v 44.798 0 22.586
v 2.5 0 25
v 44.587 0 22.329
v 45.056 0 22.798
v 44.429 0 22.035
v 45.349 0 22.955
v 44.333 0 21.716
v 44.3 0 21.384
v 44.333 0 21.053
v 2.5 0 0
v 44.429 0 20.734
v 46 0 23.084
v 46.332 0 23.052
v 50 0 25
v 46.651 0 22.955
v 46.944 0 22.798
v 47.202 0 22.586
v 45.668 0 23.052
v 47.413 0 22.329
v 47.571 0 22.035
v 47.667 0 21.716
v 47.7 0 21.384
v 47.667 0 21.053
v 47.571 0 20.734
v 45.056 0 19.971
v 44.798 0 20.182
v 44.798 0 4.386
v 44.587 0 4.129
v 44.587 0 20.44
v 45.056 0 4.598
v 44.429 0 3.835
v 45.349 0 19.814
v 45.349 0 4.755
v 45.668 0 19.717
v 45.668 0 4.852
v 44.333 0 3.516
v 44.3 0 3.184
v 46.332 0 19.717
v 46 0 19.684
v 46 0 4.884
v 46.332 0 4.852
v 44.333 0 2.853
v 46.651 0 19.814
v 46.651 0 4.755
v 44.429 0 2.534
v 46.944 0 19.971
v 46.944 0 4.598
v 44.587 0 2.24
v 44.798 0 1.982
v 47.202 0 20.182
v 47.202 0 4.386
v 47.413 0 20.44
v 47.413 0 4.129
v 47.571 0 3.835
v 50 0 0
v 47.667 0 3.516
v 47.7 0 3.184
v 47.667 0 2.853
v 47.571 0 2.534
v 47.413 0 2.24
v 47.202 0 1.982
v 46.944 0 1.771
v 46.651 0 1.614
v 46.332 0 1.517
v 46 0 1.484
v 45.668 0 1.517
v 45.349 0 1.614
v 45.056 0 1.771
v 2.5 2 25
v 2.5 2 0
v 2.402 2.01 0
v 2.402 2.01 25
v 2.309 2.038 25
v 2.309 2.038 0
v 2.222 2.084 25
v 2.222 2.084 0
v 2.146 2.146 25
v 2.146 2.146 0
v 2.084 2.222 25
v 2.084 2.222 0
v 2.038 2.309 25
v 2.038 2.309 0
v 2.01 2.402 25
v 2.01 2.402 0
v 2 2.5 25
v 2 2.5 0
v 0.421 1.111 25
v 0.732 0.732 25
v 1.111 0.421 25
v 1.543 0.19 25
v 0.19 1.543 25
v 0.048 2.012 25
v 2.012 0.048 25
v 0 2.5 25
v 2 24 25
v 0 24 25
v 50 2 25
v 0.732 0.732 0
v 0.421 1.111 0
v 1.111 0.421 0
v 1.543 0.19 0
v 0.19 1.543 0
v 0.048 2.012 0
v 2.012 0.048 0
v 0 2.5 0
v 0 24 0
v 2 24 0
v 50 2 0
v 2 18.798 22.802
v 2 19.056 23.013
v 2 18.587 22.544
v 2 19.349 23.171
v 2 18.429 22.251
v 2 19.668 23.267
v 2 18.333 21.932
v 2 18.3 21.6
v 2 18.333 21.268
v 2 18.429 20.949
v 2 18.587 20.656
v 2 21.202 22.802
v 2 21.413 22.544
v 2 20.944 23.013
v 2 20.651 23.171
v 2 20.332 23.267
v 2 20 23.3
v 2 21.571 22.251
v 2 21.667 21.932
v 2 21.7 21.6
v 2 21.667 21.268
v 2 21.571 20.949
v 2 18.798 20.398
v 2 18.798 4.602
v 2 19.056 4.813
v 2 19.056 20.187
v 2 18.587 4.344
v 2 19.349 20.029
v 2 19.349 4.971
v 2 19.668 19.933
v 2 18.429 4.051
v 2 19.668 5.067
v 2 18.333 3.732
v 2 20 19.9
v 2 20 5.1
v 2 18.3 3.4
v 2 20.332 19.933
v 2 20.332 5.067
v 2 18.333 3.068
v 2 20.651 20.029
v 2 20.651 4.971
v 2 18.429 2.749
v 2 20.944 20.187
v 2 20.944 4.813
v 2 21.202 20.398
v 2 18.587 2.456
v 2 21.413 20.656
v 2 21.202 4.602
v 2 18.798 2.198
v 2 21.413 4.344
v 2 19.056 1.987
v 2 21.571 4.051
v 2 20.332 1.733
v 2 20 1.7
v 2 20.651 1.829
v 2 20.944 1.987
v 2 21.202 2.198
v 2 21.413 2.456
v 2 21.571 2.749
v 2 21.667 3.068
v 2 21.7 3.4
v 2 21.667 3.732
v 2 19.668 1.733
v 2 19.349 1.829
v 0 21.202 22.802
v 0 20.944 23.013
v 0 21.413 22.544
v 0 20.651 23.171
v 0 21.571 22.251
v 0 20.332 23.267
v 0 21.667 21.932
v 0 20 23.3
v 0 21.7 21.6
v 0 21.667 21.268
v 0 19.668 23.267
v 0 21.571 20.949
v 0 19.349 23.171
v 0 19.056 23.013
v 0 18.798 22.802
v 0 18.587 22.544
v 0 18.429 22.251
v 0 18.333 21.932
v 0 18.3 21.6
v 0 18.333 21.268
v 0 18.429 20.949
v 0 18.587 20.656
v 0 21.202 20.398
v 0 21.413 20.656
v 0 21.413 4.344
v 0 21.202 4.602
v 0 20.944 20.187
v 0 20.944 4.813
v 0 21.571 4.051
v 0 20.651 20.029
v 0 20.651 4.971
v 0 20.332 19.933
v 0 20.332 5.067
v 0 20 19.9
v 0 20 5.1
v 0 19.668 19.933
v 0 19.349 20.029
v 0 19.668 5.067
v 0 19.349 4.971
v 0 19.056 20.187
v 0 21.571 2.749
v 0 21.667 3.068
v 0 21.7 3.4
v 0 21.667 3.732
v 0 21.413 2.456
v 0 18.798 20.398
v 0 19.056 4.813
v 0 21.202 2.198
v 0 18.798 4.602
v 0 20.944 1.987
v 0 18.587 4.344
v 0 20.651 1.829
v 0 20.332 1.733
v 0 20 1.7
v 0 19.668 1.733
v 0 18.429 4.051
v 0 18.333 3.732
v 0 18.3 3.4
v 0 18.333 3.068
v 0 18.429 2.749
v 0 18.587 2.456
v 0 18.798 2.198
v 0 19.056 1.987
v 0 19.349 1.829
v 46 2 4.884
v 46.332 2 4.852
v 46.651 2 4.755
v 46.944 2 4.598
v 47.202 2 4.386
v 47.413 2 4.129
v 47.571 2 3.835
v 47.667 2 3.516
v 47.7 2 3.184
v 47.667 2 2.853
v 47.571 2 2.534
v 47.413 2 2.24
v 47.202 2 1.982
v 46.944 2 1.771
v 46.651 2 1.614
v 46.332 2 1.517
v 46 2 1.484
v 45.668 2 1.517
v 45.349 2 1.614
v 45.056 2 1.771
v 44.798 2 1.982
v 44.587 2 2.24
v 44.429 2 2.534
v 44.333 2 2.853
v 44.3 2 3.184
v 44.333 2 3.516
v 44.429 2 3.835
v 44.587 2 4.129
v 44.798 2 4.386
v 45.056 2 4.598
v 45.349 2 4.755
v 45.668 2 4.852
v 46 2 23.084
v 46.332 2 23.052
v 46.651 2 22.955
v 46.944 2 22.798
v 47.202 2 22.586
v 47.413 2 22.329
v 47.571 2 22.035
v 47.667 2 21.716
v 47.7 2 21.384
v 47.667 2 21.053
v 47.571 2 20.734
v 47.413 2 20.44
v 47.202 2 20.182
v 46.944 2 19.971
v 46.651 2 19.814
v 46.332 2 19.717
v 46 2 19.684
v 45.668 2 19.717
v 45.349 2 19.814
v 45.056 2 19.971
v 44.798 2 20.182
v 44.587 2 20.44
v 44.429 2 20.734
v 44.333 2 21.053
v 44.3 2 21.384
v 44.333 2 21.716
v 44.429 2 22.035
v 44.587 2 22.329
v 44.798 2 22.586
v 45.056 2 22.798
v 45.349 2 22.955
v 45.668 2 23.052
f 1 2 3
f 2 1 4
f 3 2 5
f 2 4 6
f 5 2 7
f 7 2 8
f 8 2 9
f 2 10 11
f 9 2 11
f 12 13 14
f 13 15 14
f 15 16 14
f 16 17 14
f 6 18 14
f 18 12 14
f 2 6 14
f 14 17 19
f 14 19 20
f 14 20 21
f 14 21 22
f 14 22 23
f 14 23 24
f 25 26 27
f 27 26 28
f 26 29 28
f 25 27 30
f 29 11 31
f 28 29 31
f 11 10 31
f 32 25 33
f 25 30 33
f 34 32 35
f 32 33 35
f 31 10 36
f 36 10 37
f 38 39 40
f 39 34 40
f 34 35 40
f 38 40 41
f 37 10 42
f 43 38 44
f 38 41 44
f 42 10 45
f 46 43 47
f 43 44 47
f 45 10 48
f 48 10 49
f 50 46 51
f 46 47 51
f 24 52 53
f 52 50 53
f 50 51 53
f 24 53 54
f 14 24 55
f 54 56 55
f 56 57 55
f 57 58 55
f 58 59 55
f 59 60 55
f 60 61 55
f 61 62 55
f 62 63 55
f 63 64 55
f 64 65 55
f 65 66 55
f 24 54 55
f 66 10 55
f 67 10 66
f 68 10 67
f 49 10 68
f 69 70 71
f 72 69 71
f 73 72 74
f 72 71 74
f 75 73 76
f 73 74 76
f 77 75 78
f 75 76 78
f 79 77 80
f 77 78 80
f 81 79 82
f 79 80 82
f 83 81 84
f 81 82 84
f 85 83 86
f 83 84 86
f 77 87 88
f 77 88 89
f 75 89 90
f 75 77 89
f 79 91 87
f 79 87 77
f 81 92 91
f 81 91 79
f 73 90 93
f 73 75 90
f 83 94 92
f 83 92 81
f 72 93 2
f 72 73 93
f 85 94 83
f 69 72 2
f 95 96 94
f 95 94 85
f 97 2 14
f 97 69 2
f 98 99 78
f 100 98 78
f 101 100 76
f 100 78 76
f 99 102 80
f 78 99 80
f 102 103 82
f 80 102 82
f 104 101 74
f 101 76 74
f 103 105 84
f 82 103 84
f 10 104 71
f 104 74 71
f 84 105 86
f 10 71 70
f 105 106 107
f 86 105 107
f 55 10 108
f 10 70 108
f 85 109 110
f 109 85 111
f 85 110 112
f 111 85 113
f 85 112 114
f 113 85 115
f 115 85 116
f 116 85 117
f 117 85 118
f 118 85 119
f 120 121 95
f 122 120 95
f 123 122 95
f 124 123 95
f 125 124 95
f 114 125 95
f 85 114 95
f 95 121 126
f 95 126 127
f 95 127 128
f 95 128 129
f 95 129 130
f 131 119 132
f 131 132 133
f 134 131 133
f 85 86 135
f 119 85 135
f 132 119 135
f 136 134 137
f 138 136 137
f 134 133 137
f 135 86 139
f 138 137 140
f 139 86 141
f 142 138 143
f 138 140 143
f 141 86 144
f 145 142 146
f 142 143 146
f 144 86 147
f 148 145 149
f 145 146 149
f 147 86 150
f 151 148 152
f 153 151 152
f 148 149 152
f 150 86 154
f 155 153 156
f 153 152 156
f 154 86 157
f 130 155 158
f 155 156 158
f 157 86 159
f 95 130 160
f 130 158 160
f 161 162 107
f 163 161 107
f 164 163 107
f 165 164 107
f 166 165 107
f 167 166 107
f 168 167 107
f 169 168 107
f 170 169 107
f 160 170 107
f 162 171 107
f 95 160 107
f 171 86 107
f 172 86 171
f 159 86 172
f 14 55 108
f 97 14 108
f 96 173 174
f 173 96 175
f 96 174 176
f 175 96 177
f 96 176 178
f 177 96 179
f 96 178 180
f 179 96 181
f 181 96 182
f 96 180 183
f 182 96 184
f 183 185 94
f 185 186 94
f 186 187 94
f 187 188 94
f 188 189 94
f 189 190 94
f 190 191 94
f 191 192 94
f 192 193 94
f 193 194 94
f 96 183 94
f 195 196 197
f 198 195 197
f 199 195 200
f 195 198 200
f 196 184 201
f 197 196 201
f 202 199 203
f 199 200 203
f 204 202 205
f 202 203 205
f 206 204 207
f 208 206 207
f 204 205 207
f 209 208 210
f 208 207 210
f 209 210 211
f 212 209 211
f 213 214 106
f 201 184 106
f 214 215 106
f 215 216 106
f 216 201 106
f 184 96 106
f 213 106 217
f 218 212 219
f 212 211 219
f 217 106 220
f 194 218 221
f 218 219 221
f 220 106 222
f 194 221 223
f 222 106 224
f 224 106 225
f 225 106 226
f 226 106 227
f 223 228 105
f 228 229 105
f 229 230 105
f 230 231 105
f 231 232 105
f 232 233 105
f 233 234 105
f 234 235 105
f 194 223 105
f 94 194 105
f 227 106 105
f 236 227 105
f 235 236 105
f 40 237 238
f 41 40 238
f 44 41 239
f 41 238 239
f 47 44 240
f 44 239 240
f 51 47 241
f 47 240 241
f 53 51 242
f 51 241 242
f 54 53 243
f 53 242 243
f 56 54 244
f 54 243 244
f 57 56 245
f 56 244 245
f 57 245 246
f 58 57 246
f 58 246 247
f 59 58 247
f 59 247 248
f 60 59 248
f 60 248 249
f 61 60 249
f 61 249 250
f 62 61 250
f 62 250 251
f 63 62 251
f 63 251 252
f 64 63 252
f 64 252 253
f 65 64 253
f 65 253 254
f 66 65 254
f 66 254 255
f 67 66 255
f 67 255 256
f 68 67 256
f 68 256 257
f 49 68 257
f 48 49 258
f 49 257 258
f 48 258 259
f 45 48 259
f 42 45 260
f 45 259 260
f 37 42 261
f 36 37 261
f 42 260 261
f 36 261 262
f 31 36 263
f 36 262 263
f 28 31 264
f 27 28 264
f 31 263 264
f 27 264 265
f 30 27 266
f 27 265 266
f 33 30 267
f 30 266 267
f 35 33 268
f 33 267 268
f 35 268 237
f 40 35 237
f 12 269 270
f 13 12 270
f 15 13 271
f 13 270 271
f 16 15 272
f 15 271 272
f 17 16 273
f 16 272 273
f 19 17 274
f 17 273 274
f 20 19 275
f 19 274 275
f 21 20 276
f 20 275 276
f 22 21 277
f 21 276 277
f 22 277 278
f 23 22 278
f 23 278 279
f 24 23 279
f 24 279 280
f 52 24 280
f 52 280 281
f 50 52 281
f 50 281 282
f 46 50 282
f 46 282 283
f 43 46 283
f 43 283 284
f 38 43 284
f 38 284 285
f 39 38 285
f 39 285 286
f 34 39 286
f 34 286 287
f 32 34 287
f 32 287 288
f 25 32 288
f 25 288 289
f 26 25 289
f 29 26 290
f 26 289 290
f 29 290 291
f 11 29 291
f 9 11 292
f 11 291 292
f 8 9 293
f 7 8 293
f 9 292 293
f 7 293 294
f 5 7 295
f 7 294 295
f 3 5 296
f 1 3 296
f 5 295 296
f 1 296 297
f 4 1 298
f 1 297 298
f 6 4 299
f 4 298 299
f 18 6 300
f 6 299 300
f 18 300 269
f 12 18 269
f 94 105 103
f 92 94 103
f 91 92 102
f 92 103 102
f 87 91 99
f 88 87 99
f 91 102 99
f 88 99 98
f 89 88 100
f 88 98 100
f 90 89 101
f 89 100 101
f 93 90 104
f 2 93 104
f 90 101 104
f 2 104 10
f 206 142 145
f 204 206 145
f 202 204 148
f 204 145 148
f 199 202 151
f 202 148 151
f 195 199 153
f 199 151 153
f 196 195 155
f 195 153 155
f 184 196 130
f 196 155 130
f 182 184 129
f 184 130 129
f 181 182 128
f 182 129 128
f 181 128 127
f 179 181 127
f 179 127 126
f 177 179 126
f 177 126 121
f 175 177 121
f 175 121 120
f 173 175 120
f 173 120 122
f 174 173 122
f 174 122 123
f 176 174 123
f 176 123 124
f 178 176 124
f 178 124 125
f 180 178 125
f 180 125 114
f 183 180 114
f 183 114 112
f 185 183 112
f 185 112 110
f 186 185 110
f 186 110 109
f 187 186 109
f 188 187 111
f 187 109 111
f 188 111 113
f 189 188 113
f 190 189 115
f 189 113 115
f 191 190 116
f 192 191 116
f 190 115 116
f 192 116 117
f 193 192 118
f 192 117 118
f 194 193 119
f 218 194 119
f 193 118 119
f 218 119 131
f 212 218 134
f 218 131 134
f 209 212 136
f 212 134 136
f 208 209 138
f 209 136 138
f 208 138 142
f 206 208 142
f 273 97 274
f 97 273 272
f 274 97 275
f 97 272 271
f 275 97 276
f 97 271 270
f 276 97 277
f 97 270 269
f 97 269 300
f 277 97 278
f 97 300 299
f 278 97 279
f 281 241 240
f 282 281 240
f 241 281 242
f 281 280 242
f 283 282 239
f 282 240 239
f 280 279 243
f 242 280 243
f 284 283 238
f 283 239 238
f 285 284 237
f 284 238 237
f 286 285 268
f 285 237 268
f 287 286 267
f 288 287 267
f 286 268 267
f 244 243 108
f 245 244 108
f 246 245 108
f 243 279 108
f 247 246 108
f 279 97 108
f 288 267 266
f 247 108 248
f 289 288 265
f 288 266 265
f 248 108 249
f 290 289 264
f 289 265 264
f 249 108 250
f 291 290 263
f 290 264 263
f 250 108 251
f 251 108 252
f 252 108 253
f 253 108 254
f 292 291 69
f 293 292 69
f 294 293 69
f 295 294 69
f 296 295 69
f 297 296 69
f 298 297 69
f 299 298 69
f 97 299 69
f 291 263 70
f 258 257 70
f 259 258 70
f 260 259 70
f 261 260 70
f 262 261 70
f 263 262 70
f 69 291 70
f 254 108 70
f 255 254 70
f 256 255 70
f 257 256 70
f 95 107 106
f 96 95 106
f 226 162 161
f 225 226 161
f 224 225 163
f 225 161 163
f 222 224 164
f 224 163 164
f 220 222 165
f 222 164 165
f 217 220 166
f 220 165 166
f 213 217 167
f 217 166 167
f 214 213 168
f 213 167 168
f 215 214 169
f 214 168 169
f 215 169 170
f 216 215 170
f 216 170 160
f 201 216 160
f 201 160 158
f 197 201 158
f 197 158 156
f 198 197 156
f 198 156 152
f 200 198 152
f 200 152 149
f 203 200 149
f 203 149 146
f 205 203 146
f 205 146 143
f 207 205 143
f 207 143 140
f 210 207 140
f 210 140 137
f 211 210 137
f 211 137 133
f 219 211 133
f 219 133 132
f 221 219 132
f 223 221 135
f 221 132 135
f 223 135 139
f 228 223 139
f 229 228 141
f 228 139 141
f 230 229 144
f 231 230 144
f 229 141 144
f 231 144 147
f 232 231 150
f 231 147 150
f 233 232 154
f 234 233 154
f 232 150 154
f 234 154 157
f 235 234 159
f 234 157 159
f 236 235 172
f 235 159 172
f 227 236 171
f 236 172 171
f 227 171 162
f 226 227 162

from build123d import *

# Parameters (mm, degrees)
SM_BASE_FLANGE_1_DEPTH = 25
SKETCH_6_R             = 1.7
CUT_EXTRUDE_1_DEPTH    = 10
SKETCH_7_R             = 1.7
CUT_EXTRUDE_2_DEPTH    = 10


# Sheet-metal steps are written as plain solids
with BuildPart() as part:
    # Sketch 1 → 基体-法兰1 (new body)
    with BuildSketch(Plane.XY):
        with BuildLine():
            Line((0, 24), (0, 2.5))
            ThreePointArc((0, 2.5), (0.732233047, 0.732233047), (2.5, 0))
            Line((2.5, 0), (50, 0))
            Line((50, 0), (50, 2))
            Line((50, 2), (2.5, 2))
            ThreePointArc((2.5, 2), (2.146446609, 2.146446609), (2, 2.5))
            Line((2, 2.5), (2, 24))
            Line((2, 24), (0, 24))
        make_face()
    extrude(amount=SM_BASE_FLANGE_1_DEPTH)

    # 草图6 → 切除-拉伸1 (cut)
    with BuildSketch(Plane(origin=(2, 0, 0), x_dir=(0, 0, -1), z_dir=(1, 0, 0))):
        with Locations((-3.4, 20)):
            Circle(SKETCH_6_R)
        with Locations((-21.6, 20)):
            Circle(SKETCH_6_R)
    extrude(amount=-CUT_EXTRUDE_1_DEPTH, mode=Mode.SUBTRACT)

    # 草图7 → 切除-拉伸2 (cut)
    with BuildSketch(Plane(origin=(0, 2, 0), x_dir=(1, 0, 0), z_dir=(0, 1, 0))):
        with Locations(Location((46, -3.184253604, 0), (0, 0, 270))):
            Circle(SKETCH_7_R)
        with Locations(Location((46, -21.384253604, 0), (0, 0, 270))):
            Circle(SKETCH_7_R)
    extrude(amount=-CUT_EXTRUDE_2_DEPTH, mode=Mode.SUBTRACT)


solid = part.part
